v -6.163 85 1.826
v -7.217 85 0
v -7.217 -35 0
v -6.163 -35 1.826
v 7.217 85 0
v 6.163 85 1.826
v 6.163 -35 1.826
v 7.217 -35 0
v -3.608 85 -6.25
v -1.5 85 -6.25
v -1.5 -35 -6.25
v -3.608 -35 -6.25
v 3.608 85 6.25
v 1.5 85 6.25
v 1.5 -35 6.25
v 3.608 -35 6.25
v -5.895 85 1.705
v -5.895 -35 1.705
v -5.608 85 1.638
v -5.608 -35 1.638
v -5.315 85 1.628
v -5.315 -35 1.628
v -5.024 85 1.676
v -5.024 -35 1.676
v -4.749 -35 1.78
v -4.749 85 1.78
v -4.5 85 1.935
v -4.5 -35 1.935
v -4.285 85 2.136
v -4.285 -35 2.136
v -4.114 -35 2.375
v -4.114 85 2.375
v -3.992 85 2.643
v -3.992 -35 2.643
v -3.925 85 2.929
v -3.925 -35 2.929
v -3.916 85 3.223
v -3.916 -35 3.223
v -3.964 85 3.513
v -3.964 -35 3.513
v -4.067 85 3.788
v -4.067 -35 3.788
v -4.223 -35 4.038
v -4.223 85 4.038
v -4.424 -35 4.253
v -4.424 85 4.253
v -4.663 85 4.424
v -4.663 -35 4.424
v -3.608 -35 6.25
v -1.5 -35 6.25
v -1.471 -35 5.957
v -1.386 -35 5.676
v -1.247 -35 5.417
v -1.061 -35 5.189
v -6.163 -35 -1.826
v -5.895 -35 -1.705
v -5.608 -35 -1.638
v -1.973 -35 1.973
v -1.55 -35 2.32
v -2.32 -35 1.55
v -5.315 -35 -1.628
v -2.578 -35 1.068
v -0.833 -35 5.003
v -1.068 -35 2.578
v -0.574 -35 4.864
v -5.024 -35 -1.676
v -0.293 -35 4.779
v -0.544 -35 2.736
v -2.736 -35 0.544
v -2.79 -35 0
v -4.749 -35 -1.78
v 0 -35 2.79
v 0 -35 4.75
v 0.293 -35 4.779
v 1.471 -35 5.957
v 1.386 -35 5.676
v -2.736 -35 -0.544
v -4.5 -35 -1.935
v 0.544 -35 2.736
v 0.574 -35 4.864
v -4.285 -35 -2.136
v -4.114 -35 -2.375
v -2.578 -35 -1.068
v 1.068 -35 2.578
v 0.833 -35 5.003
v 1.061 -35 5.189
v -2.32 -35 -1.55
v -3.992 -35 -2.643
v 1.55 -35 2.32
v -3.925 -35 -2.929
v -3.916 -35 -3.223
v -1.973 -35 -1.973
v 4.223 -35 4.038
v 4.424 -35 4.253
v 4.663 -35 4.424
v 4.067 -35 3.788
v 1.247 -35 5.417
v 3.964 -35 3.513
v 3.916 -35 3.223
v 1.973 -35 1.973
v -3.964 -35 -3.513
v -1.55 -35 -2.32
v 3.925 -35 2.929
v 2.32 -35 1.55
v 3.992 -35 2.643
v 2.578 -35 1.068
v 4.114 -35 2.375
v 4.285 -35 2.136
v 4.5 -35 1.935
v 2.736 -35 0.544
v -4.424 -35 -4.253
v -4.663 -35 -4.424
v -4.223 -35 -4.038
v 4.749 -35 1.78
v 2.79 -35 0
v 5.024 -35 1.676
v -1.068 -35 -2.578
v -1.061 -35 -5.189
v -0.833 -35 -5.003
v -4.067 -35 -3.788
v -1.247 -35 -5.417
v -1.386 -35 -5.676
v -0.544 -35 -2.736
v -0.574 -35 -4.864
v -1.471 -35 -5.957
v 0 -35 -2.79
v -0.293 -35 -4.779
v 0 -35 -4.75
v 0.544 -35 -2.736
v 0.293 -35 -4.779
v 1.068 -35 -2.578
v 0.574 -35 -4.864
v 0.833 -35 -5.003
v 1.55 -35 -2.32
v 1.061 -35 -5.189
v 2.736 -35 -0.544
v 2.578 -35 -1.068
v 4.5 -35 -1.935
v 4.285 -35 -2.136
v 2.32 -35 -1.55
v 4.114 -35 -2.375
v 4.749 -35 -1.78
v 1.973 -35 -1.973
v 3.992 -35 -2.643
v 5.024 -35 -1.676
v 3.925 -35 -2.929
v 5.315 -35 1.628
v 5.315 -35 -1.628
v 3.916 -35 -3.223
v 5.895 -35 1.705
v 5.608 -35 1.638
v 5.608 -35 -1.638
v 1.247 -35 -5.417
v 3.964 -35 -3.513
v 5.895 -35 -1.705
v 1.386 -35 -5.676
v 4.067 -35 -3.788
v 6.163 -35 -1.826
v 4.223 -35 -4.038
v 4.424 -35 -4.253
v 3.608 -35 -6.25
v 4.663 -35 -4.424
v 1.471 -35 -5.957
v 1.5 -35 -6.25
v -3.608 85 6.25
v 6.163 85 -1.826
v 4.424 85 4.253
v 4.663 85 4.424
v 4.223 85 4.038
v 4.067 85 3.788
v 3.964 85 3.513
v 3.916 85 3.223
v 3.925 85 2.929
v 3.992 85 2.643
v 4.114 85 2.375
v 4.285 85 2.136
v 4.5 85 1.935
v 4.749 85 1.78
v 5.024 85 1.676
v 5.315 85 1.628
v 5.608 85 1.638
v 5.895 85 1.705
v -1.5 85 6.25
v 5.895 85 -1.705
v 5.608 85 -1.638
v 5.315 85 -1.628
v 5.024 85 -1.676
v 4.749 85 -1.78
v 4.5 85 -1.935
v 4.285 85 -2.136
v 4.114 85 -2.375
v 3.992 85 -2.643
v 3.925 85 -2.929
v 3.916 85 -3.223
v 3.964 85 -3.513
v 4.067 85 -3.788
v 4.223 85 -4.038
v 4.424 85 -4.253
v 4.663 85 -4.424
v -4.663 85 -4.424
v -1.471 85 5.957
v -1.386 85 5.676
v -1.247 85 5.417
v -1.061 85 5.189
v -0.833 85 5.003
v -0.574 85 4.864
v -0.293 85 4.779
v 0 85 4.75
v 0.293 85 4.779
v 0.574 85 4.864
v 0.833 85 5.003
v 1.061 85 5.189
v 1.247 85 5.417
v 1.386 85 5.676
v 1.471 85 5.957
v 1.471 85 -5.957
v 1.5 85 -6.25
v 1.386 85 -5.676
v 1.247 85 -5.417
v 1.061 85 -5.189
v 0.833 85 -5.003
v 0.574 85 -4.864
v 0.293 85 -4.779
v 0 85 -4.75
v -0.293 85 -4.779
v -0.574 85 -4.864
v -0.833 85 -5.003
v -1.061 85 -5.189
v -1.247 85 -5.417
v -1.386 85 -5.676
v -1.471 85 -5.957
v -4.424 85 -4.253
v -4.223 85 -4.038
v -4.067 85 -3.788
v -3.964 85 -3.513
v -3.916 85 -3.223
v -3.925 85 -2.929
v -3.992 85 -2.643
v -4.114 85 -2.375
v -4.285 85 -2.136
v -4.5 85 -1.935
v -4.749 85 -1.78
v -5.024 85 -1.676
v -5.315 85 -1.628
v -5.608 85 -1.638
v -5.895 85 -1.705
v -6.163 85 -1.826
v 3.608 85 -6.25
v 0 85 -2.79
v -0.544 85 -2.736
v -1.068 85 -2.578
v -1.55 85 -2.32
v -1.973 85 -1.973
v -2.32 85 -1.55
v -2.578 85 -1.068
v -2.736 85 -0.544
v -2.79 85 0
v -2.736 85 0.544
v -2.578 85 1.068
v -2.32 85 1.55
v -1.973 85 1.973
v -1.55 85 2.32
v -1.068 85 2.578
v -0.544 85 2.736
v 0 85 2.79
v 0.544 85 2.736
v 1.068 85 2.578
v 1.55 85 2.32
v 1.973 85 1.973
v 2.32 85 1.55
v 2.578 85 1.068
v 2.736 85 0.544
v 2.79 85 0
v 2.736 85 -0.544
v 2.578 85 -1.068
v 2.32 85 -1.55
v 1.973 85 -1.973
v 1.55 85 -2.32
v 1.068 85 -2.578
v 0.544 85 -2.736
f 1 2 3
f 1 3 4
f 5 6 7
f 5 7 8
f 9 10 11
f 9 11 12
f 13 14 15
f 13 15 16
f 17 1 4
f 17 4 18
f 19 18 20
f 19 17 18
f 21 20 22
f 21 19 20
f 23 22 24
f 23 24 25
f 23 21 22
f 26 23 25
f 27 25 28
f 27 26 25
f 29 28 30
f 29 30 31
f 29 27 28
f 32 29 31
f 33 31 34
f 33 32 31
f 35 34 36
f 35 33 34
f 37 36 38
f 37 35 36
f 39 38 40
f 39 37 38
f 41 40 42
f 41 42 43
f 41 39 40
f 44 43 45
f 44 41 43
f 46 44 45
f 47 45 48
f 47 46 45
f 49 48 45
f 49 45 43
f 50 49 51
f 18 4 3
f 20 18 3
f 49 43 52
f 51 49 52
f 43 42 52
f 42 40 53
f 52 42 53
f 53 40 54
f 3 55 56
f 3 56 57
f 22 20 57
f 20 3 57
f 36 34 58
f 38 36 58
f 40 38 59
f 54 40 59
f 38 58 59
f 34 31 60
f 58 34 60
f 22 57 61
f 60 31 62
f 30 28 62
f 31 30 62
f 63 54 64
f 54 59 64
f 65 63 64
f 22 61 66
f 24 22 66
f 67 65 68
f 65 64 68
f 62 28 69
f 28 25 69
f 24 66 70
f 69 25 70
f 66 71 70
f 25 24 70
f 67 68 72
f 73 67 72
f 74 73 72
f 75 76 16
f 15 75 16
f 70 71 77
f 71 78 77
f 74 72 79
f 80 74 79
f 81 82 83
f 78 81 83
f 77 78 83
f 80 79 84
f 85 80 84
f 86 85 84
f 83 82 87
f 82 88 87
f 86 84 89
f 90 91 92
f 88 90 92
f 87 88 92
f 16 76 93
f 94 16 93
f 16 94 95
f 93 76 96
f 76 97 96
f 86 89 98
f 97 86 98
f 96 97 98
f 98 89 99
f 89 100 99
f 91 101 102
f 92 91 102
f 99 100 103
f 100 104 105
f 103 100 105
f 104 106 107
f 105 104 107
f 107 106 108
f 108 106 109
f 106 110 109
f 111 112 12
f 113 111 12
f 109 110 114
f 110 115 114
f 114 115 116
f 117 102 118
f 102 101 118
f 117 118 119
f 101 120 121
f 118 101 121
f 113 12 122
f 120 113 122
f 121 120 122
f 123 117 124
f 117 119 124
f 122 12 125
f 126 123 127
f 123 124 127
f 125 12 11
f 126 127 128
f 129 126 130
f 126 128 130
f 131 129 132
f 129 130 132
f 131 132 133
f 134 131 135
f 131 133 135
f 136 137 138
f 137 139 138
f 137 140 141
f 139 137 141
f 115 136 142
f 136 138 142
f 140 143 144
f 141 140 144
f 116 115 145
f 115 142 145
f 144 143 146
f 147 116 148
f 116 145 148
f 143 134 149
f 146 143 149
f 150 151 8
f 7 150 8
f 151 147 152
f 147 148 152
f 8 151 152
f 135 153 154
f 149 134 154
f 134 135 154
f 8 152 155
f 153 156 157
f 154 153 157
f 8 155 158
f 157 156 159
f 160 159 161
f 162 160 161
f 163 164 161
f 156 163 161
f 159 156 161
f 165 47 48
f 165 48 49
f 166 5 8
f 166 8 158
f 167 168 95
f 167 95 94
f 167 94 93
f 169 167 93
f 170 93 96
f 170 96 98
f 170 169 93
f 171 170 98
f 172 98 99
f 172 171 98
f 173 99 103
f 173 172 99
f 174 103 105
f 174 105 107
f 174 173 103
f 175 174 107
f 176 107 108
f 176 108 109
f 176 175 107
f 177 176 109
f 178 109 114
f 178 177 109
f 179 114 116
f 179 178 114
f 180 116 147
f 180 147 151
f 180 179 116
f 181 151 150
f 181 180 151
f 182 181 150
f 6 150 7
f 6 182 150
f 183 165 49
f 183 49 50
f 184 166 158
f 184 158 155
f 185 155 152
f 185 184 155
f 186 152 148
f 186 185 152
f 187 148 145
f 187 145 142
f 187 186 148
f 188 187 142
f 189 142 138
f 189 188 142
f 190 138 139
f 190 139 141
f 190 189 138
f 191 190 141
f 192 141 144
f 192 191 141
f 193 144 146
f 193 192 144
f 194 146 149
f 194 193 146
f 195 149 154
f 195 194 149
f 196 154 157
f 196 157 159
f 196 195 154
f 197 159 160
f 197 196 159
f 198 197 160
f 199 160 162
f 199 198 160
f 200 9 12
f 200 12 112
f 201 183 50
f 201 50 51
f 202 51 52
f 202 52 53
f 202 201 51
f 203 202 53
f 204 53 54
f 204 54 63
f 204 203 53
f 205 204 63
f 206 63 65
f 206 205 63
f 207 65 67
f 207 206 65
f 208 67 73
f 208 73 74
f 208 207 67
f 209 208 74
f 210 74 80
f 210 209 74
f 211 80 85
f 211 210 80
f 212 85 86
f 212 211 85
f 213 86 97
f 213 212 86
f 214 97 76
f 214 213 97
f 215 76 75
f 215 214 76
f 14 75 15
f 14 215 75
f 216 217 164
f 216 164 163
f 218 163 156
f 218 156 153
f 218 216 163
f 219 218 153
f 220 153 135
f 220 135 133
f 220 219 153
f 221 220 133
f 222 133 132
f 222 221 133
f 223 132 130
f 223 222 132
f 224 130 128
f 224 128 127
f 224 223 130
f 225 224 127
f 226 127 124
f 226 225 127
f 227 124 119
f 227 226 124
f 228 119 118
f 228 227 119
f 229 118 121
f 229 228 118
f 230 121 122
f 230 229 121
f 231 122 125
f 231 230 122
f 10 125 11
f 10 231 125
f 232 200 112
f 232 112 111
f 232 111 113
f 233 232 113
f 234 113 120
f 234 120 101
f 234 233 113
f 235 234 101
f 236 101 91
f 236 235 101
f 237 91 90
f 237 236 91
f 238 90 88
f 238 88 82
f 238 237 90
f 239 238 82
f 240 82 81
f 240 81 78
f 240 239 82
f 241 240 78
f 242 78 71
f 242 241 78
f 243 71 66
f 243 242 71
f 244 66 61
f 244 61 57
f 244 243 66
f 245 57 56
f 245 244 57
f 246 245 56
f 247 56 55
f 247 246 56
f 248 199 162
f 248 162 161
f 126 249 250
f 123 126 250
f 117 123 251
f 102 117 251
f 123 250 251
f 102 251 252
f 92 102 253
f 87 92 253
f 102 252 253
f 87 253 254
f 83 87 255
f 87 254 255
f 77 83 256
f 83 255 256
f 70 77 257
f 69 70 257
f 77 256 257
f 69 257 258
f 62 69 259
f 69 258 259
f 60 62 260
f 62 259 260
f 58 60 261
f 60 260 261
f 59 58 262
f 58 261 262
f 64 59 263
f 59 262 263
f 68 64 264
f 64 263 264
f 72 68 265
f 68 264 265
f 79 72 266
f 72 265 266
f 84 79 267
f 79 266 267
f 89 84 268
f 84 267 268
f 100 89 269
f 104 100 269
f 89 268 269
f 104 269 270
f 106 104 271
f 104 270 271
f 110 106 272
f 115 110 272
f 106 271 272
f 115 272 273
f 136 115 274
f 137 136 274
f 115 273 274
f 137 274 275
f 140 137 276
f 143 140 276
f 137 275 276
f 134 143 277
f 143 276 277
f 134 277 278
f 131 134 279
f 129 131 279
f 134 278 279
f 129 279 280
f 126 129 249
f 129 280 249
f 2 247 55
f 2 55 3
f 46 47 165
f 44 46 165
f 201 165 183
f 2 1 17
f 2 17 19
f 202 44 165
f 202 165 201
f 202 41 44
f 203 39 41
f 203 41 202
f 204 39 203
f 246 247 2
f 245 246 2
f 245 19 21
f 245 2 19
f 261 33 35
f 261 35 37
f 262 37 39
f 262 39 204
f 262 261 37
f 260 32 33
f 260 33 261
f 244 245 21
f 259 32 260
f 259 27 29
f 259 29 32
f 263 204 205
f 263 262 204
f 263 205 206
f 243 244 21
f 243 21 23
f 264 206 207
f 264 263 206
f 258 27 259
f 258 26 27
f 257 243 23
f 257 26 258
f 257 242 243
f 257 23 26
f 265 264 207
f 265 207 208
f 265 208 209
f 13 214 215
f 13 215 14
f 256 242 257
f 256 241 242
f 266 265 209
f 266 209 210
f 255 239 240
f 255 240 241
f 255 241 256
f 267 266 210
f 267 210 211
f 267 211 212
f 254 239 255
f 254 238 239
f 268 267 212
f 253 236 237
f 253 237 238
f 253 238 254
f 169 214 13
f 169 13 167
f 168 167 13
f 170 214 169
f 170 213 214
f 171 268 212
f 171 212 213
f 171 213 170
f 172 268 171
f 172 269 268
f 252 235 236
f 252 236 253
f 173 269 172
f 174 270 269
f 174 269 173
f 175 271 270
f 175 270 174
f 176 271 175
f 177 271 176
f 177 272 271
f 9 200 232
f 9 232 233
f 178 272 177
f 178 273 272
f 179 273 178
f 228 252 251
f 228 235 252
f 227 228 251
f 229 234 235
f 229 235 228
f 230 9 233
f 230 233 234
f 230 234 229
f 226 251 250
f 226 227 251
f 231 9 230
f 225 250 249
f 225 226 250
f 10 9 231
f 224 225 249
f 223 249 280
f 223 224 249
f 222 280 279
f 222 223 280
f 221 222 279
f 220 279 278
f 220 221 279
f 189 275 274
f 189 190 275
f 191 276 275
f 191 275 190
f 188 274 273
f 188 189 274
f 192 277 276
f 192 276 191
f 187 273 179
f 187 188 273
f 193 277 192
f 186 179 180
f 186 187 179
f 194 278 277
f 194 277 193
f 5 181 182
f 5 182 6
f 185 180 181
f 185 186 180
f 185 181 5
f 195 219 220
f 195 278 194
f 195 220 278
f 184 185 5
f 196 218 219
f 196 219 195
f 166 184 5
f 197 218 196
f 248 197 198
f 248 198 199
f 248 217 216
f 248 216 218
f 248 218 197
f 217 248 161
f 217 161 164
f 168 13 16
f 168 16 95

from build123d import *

# Parameters (mm, degrees)
ESBO_O1_R                = 2.79
RESSALTO_EXTRUS_O1_DEPTH = 120


with BuildPart() as part:
    # Esboço1 → Ressalto-extrusão1 (new body)
    with BuildSketch(Plane(origin=(0, 85, 0), x_dir=(1, 0, 0), z_dir=(0, 1, 0))):
        with BuildLine():
            Line((6.162658774, -1.825961894), (7.216878365, 0))
            Line((7.216878365, 0), (6.162658774, 1.825961894))
            ThreePointArc((6.162658774, 1.825961894), (4.113620668, 2.375), (4.662658774, 4.424038106))
            Line((4.662658774, 4.424038106), (3.608439182, 6.25))
            Line((3.608439182, 6.25), (1.5, 6.25))
            ThreePointArc((1.5, 6.25), (0, 4.75), (-1.5, 6.25))
            Line((-1.5, 6.25), (-3.608439182, 6.25))
            Line((-3.608439182, 6.25), (-4.662658774, 4.424038106))
            ThreePointArc((-4.662658774, 4.424038106), (-4.113620668, 2.375), (-6.162658774, 1.825961894))
            Line((-6.162658774, 1.825961894), (-7.216878365, 0))
            Line((-7.216878365, 0), (-6.162658774, -1.825961894))
            ThreePointArc((-6.162658774, -1.825961894), (-4.113620668, -2.375), (-4.662658774, -4.424038106))
            Line((-4.662658774, -4.424038106), (-3.608439182, -6.25))
            Line((-3.608439182, -6.25), (-1.5, -6.25))
            ThreePointArc((-1.5, -6.25), (0, -4.75), (1.5, -6.25))
            Line((1.5, -6.25), (3.608439182, -6.25))
            Line((3.608439182, -6.25), (4.662658774, -4.424038106))
            ThreePointArc((4.662658774, -4.424038106), (4.113620668, -2.375), (6.162658774, -1.825961894))
        make_face()
        with Locations(Location((0, 0, 0), (0, 0, 90))):
            Circle(ESBO_O1_R, mode=Mode.SUBTRACT)
    extrude(amount=-RESSALTO_EXTRUS_O1_DEPTH)


solid = part.part
